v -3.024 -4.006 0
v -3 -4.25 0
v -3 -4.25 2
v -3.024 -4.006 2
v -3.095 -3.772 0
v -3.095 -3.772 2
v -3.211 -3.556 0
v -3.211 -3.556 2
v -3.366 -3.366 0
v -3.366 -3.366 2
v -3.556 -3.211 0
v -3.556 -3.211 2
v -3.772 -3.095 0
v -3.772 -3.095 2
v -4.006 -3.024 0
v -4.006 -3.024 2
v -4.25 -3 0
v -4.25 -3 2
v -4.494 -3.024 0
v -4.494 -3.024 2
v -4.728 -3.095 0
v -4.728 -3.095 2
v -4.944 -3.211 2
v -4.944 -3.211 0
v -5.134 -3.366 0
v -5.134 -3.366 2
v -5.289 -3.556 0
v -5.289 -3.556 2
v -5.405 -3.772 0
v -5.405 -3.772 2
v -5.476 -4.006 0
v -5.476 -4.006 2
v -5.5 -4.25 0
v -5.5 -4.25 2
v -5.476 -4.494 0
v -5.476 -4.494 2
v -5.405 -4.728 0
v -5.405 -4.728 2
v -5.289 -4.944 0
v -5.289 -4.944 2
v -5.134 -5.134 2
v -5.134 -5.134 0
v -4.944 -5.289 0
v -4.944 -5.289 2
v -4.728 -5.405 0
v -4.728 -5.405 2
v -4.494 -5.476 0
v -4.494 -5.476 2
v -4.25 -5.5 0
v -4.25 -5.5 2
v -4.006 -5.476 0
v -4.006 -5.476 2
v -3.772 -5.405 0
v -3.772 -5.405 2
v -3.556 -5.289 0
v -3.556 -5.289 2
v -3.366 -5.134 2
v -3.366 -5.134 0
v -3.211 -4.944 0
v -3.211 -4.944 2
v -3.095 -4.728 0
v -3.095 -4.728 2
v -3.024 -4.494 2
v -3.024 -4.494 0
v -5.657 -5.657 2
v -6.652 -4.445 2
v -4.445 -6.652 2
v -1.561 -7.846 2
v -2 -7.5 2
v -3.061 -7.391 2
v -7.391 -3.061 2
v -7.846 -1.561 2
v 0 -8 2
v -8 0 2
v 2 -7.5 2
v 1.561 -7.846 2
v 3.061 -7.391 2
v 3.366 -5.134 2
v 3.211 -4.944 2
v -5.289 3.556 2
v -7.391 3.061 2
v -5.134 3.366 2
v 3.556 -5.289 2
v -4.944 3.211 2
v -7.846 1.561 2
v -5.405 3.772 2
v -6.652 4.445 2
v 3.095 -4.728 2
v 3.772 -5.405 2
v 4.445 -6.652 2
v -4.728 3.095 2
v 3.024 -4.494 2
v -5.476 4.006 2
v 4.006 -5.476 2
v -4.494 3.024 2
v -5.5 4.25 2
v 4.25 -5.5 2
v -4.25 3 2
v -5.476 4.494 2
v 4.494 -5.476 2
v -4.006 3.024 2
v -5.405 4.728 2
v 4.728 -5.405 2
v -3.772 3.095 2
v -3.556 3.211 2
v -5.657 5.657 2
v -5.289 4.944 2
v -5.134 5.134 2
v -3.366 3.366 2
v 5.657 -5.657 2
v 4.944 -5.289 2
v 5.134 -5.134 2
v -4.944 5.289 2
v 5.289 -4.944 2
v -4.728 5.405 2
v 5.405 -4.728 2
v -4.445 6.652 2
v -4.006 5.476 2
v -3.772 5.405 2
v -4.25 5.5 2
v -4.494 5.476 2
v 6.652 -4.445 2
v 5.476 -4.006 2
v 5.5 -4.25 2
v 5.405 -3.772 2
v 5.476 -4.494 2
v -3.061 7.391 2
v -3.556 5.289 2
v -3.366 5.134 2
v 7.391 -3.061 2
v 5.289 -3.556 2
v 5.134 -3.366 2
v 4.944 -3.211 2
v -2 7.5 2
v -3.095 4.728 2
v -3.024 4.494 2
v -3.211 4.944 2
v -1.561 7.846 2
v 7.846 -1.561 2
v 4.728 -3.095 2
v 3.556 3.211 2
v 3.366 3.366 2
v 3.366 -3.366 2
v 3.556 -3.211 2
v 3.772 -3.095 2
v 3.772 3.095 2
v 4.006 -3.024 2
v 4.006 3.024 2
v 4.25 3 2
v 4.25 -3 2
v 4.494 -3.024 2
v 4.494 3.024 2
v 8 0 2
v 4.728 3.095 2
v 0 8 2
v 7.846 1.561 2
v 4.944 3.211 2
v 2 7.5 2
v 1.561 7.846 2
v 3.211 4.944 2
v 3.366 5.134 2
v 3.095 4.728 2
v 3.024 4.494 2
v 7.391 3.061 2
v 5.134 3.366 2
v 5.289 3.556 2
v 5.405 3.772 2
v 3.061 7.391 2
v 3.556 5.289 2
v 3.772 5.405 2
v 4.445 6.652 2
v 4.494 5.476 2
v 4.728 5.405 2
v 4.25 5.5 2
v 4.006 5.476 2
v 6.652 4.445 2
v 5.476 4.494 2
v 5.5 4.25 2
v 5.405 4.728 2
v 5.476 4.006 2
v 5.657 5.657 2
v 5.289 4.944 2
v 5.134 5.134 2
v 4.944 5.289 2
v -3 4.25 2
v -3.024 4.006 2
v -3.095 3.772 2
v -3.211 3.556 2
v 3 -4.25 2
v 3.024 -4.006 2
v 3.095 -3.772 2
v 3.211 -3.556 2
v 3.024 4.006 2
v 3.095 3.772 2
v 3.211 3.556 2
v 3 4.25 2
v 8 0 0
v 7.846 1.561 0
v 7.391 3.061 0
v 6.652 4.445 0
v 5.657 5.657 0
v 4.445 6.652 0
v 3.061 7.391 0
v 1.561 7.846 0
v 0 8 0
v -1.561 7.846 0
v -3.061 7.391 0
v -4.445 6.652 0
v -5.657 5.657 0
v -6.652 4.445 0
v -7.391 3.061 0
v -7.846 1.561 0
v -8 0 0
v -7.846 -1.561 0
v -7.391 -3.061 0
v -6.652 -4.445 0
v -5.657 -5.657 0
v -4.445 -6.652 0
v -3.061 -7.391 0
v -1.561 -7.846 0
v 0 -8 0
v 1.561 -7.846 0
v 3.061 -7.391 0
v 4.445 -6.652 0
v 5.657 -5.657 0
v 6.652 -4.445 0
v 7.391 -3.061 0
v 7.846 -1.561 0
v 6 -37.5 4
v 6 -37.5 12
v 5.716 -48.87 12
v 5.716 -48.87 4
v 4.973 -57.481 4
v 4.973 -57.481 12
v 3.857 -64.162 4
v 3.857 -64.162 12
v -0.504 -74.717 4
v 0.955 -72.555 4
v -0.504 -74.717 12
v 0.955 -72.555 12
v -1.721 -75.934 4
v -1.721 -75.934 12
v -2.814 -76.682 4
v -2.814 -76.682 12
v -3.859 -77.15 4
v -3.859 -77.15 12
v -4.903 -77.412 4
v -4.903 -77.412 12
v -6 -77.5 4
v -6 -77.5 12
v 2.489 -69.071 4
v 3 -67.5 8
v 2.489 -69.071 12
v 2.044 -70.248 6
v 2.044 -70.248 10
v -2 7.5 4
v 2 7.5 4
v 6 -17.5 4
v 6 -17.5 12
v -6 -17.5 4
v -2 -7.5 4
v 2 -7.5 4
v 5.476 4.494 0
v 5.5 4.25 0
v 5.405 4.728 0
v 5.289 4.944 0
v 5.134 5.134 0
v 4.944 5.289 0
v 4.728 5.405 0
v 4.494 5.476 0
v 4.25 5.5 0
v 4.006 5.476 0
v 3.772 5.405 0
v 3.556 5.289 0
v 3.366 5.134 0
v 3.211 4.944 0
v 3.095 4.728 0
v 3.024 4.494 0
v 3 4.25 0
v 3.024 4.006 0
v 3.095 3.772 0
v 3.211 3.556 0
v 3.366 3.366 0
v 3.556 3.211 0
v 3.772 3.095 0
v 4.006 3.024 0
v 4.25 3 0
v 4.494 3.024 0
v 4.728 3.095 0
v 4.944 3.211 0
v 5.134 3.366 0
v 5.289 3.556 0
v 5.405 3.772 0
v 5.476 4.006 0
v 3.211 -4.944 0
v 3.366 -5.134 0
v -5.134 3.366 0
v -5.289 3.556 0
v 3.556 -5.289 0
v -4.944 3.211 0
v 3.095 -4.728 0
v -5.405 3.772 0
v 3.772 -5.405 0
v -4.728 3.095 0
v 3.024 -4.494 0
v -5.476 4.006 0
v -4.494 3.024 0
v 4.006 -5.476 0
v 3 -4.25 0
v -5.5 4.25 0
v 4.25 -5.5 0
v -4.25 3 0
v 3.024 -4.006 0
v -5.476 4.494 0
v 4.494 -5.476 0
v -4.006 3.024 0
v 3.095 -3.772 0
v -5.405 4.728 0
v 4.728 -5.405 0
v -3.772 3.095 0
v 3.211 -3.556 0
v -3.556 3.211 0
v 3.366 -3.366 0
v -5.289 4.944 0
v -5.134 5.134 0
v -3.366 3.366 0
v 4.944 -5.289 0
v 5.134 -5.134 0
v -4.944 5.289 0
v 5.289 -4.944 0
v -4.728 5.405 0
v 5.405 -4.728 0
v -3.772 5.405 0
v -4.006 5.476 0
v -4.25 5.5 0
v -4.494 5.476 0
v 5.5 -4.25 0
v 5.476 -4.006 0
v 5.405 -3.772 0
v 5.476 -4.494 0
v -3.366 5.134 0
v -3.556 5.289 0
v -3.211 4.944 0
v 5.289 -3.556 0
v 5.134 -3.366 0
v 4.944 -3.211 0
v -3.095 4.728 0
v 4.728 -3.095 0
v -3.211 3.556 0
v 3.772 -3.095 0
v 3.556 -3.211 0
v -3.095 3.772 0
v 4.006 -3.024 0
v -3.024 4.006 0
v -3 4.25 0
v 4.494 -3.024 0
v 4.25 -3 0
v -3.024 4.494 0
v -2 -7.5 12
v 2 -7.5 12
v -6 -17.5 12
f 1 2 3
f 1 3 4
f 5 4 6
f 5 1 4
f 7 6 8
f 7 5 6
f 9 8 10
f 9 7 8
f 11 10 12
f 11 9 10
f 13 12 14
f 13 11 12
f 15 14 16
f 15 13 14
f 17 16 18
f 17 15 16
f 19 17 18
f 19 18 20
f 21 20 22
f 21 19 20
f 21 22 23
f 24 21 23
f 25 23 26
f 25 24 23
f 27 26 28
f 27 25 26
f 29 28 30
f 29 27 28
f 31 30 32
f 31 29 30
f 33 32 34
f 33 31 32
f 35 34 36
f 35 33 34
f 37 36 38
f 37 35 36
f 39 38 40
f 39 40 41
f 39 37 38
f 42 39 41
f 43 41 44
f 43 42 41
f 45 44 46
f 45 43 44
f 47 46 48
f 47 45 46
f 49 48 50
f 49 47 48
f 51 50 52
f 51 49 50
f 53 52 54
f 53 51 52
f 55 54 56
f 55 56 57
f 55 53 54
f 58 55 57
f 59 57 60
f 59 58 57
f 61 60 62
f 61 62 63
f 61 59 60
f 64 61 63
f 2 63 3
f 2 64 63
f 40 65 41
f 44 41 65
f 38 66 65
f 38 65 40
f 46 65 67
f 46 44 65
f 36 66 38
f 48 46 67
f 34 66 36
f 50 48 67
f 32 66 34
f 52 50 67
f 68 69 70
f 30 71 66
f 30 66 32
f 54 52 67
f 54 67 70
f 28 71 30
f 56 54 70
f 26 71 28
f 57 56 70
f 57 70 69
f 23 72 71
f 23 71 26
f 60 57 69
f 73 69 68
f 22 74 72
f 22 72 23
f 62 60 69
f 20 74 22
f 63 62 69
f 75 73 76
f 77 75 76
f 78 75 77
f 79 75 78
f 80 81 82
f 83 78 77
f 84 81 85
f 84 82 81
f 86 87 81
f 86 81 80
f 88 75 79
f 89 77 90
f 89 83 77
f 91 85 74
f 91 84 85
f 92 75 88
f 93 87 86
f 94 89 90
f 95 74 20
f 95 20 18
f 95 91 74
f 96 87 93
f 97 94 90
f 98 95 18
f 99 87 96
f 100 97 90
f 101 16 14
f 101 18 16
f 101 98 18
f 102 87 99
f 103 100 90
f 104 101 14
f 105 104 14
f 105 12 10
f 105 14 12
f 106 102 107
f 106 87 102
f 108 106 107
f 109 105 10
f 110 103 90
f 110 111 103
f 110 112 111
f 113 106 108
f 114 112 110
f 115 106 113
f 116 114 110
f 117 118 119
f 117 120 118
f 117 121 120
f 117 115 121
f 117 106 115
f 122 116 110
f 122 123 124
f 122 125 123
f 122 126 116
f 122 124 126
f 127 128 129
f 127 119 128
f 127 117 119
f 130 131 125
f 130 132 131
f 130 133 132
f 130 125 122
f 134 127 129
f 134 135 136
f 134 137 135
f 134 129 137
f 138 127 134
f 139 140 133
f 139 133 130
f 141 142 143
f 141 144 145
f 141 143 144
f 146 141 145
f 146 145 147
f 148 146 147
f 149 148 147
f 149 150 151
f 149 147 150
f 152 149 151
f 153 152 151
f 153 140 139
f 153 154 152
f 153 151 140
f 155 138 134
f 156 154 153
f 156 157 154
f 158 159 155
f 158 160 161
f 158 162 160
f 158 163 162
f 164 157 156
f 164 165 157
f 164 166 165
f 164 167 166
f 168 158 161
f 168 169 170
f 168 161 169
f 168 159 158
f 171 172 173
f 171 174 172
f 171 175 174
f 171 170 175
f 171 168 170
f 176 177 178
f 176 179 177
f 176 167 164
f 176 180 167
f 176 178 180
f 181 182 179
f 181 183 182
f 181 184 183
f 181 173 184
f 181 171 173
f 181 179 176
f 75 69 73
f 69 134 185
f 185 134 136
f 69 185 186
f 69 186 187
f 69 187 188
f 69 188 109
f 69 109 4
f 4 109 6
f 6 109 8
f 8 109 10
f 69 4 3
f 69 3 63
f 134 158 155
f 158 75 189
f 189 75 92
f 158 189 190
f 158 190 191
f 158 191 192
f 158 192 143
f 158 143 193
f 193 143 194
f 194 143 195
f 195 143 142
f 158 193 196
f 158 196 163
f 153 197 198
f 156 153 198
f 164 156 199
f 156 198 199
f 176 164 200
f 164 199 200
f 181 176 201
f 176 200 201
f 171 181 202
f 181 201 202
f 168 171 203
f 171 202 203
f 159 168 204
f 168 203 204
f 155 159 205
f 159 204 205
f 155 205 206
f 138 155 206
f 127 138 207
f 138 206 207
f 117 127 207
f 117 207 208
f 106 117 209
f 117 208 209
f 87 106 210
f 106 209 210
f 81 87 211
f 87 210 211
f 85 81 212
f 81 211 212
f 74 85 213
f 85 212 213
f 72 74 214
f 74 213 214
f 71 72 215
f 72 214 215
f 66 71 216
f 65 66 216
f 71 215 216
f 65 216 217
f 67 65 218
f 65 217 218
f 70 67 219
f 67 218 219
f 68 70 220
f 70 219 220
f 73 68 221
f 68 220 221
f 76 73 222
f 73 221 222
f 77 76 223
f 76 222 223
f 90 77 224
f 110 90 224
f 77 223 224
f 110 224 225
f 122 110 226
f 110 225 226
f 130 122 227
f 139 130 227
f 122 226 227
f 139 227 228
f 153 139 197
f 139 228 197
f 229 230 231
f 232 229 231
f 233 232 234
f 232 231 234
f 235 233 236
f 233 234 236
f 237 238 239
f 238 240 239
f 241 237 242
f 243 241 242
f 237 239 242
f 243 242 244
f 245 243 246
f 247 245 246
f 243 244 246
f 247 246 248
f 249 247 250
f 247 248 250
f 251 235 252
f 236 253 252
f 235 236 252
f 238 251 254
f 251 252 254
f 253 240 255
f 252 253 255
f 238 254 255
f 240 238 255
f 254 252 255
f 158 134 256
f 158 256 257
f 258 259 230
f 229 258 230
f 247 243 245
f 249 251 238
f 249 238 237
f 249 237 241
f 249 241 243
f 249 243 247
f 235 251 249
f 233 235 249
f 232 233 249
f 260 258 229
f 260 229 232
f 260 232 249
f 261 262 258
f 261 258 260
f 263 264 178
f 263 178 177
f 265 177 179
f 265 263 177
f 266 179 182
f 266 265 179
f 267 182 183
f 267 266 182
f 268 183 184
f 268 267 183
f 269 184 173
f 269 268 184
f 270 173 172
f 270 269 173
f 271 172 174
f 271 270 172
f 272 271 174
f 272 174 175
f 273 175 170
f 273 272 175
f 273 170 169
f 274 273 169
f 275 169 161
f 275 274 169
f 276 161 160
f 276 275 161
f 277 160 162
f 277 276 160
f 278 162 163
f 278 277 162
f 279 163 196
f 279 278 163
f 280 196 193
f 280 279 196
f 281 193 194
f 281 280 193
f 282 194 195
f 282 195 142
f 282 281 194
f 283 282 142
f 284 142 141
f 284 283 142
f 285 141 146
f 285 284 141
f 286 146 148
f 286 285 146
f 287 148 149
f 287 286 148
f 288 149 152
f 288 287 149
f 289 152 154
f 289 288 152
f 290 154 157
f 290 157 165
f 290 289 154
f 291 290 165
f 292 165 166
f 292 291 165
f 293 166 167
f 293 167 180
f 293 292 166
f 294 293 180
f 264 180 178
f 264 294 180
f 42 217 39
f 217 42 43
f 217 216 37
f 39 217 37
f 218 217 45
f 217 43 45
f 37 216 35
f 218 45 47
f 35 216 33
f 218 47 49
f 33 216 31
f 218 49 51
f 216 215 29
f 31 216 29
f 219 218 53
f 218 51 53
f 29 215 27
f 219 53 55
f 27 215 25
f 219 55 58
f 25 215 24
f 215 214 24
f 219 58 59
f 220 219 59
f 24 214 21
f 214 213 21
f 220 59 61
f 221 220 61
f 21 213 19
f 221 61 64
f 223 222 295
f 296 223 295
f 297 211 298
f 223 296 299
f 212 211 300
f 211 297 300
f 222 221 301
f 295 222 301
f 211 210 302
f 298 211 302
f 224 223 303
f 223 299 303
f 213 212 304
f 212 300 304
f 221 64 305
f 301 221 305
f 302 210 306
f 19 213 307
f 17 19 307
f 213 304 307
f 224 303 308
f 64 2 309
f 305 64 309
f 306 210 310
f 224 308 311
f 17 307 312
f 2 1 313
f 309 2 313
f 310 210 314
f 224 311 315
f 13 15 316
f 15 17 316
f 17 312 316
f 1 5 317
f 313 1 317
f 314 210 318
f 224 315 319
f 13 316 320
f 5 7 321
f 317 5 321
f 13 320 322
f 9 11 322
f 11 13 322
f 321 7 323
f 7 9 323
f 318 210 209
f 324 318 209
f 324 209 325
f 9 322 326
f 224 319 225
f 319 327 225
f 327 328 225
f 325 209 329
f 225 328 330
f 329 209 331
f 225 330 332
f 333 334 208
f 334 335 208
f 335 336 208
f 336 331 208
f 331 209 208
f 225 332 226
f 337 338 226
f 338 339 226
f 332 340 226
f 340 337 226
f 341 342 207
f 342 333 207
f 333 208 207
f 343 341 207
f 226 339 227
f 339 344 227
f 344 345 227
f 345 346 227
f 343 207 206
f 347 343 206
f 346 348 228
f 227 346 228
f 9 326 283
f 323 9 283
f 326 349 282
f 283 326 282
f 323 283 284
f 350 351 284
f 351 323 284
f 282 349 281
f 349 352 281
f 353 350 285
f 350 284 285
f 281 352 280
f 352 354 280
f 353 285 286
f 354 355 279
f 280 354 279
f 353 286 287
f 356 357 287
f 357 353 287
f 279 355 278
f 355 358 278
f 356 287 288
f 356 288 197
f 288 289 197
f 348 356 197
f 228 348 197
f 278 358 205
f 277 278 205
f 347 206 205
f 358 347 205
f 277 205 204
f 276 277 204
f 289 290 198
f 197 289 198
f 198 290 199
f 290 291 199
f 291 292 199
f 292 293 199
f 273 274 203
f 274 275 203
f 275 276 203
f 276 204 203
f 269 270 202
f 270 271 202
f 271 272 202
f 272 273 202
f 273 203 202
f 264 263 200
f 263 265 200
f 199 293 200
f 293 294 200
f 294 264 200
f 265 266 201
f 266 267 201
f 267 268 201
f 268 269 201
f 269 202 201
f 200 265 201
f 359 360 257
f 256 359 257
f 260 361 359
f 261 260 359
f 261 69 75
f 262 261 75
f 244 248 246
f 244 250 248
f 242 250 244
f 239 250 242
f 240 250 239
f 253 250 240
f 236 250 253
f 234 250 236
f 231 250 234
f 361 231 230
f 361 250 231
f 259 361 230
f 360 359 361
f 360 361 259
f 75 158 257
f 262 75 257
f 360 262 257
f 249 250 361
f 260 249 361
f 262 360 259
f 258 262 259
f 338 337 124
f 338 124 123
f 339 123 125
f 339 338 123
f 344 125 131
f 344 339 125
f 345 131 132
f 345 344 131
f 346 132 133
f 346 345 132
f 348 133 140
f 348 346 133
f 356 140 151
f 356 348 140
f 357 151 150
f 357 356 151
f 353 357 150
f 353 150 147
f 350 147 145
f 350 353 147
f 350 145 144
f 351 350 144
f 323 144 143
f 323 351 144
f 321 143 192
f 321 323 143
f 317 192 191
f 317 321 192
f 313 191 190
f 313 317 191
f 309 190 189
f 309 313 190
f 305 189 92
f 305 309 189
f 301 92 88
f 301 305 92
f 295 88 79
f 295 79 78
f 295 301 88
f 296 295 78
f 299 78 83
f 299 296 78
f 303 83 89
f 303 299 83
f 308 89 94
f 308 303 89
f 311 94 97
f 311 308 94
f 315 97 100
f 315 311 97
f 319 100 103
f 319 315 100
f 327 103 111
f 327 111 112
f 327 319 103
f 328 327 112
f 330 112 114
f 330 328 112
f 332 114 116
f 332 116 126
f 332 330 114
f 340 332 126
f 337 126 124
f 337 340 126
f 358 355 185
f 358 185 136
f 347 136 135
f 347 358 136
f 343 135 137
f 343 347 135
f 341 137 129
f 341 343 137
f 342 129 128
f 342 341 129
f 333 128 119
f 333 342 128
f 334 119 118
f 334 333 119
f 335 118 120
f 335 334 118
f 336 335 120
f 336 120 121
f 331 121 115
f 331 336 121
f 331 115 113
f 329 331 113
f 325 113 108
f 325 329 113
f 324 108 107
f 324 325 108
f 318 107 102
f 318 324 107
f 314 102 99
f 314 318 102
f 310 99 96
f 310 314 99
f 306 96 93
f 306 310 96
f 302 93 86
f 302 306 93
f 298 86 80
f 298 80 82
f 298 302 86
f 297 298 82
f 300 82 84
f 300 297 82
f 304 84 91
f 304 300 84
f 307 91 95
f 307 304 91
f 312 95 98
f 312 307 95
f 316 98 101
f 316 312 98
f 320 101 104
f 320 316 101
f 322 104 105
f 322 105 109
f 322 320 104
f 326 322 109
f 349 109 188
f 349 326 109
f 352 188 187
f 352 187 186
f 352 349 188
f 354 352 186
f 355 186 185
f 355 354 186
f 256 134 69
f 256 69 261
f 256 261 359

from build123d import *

# Parameters (mm, degrees)
SKETCH_R     = 8
SKETCH_R_2   = 1.25
PAD_DEPTH    = 2
SKETCH001_W  = 4
SKETCH001_H  = 15
PAD001_DEPTH = 10
SKETCH002_W  = 4
SKETCH002_H  = 8
PAD002_DEPTH = 30
POCKET_DEPTH = 5
PAD003_DEPTH = 8


with BuildPart() as part:
    # Sketch → Pad (new body)
    with BuildSketch(Plane.XY):
        Circle(SKETCH_R)
        with Locations((-4.25, 4.25)):
            Circle(SKETCH_R_2, mode=Mode.SUBTRACT)
        with Locations((4.25, 4.25)):
            Circle(SKETCH_R_2, mode=Mode.SUBTRACT)
        with Locations((4.25, -4.25)):
            Circle(SKETCH_R_2, mode=Mode.SUBTRACT)
        with Locations((-4.25, -4.25)):
            Circle(SKETCH_R_2, mode=Mode.SUBTRACT)
    extrude(amount=PAD_DEPTH)

    # Sketch001 (on Face7 of Pad) → Pad001 (join)
    with BuildSketch(Plane.XY.offset(2)):
        Rectangle(SKETCH001_W, SKETCH001_H)
    extrude(amount=PAD001_DEPTH)

    # Sketch002 (on Face9 of Pad001) → Pad002 (join)
    with BuildSketch(Plane.XZ.offset(7.5)):
        with Locations((0, 8)):
            Rectangle(SKETCH002_W, SKETCH002_H)
    extrude(amount=PAD002_DEPTH)

    # Sketch003 (on Face10 of Pad002) → Pocket (cut)
    with BuildSketch(Plane.YZ.offset(2)):
        Polygon((-7.5, 12), (7.5, 4), (17.5, 4), (17.5, 22), (-7.5, 22), align=None)
    extrude(amount=-POCKET_DEPTH, mode=Mode.SUBTRACT)

    # Sketch004 (on Face16 of Pocket) → Pad003 (join)
    with BuildSketch(Plane.XY.offset(12)):
        with BuildLine():
            Line((-2, -7.5), (2, -7.5))
            Line((2, -7.5), (6, -17.5))
            Line((6, -17.5), (6, -37.5))
            add(Edge.make_bspline(
                [(6, -37.5), (6, -77.5), (-6, -77.5)],
                knots=[0, 0, 0, 1, 1, 1], degree=2))
            Line((-6, -77.5), (-6, -17.5))
            Line((-6, -17.5), (-2, -7.5))
        make_face()
    extrude(amount=-PAD003_DEPTH)


solid = part.part
